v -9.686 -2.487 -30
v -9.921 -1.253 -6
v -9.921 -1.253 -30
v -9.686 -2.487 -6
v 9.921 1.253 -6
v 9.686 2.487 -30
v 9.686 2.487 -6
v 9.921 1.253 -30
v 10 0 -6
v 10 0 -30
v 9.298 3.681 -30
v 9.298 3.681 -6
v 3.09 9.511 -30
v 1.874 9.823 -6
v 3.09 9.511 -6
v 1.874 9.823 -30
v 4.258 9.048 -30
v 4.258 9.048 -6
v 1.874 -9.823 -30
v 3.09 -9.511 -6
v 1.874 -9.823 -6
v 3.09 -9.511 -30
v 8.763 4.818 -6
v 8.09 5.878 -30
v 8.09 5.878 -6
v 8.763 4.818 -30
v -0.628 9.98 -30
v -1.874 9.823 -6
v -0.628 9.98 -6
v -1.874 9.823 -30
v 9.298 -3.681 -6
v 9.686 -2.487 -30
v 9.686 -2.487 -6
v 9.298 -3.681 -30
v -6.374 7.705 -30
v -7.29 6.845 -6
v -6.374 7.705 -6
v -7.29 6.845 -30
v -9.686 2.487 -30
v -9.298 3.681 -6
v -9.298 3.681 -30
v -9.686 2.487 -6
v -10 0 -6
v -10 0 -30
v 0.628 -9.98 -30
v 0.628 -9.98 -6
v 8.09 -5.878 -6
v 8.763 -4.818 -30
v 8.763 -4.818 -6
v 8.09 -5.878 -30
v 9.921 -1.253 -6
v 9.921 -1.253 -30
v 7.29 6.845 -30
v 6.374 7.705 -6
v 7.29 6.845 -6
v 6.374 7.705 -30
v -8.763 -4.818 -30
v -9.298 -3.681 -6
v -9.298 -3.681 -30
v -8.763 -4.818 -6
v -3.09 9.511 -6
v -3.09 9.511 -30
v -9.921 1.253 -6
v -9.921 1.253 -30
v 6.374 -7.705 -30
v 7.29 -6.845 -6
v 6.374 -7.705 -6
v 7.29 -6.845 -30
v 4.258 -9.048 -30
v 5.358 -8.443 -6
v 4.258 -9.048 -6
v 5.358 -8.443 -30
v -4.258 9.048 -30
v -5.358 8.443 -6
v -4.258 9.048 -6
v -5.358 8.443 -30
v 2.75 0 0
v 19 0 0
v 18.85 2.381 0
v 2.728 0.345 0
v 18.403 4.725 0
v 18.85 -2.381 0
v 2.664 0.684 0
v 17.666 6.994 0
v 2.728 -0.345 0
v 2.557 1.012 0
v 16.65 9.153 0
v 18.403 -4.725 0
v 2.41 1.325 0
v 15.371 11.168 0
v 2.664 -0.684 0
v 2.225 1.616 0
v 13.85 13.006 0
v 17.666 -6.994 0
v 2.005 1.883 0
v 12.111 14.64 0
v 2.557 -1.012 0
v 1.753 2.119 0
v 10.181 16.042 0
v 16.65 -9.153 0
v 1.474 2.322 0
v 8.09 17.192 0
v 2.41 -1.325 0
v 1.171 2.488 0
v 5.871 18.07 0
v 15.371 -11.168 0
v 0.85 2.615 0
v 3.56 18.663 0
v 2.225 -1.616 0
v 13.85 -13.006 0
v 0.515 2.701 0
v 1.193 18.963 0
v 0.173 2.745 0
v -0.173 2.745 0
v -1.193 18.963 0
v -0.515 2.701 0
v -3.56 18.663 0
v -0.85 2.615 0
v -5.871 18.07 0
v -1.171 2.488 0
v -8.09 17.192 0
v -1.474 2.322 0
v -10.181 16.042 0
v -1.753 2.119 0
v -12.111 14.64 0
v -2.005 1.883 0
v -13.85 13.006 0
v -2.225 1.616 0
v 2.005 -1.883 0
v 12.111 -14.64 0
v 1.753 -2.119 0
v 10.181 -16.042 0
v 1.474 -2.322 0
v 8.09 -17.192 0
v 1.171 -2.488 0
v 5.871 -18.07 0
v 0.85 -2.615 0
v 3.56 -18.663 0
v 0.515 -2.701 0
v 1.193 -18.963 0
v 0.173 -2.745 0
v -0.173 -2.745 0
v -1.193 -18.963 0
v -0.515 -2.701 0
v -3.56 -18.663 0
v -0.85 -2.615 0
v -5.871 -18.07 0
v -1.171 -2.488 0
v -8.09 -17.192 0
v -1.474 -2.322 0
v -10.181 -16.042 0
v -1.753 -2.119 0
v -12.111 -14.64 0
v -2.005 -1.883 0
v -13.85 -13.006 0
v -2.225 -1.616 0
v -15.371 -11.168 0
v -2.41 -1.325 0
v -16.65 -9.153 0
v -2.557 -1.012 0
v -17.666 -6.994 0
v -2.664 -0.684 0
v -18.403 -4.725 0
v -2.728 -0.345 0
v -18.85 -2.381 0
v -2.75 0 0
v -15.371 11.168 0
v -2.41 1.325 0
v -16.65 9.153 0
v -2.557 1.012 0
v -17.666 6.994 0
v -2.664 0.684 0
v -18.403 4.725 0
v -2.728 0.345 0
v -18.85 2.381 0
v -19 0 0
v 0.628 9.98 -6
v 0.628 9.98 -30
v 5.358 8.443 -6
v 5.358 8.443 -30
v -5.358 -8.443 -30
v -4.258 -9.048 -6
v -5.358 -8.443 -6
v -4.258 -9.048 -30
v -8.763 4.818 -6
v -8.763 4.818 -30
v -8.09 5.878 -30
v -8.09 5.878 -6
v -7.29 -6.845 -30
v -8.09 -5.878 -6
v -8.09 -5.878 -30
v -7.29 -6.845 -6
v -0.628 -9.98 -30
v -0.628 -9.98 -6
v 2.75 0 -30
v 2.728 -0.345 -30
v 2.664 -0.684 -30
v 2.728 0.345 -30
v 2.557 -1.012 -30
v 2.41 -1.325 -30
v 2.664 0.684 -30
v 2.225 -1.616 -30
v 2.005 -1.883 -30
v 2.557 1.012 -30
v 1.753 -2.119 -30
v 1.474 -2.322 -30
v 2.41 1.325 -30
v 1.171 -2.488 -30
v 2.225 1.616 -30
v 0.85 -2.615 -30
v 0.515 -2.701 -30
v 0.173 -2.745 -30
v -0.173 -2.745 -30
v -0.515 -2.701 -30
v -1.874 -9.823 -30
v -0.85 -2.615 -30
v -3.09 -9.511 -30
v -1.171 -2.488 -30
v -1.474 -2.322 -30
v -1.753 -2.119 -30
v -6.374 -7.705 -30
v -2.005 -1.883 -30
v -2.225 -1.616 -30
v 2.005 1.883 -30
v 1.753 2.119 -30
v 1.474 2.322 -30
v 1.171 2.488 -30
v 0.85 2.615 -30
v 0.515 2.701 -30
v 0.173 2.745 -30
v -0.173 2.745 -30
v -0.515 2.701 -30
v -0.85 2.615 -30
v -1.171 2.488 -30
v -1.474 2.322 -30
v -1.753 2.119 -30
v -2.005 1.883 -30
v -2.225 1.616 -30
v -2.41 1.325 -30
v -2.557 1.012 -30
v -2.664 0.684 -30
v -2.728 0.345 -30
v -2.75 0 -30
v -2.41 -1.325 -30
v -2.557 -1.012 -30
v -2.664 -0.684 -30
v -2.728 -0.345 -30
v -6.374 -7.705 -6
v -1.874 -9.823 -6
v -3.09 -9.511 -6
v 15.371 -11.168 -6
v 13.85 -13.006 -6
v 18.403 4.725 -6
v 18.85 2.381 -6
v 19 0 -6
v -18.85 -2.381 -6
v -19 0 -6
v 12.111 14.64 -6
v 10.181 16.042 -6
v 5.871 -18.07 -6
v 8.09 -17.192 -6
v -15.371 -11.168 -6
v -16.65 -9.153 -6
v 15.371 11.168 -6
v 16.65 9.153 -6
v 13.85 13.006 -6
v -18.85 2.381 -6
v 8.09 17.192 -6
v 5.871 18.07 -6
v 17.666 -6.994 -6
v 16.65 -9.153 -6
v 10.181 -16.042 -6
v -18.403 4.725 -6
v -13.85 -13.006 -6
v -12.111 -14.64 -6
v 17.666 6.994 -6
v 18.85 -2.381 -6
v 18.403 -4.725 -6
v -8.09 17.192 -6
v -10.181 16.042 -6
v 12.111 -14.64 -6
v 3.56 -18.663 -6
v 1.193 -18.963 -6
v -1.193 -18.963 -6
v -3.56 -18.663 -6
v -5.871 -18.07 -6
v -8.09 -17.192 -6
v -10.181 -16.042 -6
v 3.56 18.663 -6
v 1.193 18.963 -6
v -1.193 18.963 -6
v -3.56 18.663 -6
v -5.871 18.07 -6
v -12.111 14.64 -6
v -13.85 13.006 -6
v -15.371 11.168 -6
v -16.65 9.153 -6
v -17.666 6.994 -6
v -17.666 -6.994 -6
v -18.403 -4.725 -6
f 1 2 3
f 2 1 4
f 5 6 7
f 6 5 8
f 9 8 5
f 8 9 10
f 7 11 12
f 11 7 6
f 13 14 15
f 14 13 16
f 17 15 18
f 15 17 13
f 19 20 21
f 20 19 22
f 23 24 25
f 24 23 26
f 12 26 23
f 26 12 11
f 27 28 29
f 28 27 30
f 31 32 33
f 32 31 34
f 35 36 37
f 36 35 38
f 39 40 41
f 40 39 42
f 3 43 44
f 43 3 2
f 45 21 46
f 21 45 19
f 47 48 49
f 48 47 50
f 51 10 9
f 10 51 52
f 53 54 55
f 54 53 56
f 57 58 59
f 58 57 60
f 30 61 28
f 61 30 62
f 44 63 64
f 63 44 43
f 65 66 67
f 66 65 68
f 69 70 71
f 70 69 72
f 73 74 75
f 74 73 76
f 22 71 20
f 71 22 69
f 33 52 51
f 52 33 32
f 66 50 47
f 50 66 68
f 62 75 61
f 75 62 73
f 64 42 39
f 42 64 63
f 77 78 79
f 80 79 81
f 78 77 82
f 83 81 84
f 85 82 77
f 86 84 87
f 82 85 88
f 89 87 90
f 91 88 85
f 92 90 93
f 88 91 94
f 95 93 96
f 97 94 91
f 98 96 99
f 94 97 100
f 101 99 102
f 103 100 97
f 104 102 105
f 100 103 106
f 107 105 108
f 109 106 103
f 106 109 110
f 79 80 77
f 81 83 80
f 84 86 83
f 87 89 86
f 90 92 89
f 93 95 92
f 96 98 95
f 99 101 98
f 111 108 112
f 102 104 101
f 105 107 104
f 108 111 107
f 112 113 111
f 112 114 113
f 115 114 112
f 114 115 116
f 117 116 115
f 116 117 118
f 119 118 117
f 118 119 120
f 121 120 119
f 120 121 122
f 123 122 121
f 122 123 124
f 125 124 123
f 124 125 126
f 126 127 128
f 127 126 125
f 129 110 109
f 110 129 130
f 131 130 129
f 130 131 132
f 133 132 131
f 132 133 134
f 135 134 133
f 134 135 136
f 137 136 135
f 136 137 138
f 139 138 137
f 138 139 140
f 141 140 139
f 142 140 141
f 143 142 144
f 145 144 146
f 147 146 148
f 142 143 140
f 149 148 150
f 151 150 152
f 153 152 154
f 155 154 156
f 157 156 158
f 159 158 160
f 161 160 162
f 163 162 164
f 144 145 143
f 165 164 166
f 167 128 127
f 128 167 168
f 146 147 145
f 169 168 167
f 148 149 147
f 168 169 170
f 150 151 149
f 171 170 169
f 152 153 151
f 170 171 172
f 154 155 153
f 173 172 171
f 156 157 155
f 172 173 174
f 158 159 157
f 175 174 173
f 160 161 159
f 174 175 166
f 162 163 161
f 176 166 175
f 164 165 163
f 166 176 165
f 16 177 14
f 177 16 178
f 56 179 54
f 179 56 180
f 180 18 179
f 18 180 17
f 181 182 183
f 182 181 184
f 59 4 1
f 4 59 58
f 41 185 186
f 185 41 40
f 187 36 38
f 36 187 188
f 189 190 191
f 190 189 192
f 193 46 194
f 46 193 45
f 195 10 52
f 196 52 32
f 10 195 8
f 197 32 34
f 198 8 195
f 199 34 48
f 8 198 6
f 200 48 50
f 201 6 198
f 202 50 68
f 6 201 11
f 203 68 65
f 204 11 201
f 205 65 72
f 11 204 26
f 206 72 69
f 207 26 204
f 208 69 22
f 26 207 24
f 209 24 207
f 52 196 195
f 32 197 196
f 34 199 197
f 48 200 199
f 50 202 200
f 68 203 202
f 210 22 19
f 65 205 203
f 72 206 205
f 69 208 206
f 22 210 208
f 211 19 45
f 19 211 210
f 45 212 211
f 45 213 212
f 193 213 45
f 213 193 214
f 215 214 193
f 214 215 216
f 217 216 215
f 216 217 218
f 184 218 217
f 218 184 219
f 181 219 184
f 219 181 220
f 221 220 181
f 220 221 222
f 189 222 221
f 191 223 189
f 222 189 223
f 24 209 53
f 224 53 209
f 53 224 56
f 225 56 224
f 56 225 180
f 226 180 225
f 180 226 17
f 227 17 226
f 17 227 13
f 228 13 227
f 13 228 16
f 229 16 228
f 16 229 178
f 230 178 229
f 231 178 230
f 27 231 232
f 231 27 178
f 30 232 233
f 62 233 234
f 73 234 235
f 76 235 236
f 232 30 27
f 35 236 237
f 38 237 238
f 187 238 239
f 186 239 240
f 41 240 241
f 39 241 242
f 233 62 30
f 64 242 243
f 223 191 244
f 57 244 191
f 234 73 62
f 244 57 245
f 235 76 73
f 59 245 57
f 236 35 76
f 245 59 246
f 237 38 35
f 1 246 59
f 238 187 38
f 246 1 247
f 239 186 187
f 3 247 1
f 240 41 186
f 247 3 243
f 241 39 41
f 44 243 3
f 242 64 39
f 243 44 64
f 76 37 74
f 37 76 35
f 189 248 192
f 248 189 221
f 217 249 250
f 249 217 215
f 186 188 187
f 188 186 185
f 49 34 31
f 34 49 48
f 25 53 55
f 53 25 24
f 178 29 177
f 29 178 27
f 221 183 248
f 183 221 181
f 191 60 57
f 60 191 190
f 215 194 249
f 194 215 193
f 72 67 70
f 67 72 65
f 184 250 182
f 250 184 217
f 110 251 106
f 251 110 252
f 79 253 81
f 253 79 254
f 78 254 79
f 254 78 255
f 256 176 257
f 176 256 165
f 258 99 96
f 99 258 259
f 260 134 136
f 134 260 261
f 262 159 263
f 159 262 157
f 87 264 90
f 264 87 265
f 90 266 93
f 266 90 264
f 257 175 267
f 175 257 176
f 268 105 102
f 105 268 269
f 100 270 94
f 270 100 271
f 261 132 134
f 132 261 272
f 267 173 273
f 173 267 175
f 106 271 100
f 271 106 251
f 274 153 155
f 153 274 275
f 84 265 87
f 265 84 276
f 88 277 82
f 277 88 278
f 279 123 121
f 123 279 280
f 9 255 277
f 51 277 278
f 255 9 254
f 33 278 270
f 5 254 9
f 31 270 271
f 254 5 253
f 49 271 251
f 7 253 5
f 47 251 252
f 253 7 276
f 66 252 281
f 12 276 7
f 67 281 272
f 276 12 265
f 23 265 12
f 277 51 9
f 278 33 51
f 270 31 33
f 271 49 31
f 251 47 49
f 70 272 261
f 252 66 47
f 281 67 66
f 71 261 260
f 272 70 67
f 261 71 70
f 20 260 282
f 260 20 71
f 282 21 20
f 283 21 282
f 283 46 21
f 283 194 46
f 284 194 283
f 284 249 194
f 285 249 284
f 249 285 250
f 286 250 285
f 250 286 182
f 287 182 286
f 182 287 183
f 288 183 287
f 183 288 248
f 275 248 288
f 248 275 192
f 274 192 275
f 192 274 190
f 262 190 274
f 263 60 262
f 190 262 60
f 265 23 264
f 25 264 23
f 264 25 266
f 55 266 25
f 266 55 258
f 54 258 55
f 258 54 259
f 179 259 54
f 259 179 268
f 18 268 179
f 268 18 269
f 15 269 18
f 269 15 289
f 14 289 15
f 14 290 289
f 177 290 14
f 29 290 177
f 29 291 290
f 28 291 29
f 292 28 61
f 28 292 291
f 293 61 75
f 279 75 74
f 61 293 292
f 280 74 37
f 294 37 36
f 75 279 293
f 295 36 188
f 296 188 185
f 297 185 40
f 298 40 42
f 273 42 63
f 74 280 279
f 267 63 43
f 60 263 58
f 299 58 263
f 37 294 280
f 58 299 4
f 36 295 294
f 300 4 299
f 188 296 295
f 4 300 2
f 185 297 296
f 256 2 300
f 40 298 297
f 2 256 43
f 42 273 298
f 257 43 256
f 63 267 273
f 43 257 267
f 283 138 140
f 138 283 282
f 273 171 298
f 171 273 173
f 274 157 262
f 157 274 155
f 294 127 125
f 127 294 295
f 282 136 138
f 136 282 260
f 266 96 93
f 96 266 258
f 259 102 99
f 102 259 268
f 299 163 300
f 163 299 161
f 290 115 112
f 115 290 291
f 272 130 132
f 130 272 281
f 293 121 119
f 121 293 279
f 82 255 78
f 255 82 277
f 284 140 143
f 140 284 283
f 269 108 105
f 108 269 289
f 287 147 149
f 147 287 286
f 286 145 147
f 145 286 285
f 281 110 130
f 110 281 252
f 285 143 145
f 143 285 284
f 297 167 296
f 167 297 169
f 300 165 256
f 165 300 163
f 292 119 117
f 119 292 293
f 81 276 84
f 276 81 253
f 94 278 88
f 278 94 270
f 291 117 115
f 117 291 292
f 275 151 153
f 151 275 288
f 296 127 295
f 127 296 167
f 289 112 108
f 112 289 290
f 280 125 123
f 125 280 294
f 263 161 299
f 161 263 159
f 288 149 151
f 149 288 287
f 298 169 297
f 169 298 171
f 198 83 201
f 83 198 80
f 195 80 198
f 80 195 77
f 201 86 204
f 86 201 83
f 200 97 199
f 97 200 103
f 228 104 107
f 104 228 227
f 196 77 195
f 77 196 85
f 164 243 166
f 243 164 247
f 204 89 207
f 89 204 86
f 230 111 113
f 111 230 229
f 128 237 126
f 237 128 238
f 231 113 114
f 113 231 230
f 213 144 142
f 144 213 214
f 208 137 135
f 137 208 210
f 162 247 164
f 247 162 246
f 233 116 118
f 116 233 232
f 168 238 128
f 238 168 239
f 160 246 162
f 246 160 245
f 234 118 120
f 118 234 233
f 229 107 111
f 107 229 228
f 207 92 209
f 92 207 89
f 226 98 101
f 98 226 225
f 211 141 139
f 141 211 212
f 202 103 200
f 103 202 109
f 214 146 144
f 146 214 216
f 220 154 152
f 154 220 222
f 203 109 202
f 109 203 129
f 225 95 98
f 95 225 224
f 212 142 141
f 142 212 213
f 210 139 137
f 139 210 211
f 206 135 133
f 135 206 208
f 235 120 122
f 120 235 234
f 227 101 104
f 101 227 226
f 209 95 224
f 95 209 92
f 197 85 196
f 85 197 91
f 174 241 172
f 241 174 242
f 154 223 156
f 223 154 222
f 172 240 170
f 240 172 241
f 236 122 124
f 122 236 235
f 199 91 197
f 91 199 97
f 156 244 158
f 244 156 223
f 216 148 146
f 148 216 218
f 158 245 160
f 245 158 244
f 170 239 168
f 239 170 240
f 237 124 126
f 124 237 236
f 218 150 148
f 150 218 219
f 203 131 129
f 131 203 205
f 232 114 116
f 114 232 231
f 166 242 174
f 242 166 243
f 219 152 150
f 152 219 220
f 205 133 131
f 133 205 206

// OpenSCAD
$fn = 50;


difference() {
	union() {
		translate(v = [0, 0, -30.0000000000]) {
			cylinder(h = 30, r = 10.0000000000);
		}
		translate(v = [0, 0, -6.0000000000]) {
			cylinder(h = 6, r = 19.0000000000);
		}
	}
	union() {
		#translate(v = [0, 0, -30]) {
			cylinder(h = 30, r = 2.7500000000);
		}
	}
}
